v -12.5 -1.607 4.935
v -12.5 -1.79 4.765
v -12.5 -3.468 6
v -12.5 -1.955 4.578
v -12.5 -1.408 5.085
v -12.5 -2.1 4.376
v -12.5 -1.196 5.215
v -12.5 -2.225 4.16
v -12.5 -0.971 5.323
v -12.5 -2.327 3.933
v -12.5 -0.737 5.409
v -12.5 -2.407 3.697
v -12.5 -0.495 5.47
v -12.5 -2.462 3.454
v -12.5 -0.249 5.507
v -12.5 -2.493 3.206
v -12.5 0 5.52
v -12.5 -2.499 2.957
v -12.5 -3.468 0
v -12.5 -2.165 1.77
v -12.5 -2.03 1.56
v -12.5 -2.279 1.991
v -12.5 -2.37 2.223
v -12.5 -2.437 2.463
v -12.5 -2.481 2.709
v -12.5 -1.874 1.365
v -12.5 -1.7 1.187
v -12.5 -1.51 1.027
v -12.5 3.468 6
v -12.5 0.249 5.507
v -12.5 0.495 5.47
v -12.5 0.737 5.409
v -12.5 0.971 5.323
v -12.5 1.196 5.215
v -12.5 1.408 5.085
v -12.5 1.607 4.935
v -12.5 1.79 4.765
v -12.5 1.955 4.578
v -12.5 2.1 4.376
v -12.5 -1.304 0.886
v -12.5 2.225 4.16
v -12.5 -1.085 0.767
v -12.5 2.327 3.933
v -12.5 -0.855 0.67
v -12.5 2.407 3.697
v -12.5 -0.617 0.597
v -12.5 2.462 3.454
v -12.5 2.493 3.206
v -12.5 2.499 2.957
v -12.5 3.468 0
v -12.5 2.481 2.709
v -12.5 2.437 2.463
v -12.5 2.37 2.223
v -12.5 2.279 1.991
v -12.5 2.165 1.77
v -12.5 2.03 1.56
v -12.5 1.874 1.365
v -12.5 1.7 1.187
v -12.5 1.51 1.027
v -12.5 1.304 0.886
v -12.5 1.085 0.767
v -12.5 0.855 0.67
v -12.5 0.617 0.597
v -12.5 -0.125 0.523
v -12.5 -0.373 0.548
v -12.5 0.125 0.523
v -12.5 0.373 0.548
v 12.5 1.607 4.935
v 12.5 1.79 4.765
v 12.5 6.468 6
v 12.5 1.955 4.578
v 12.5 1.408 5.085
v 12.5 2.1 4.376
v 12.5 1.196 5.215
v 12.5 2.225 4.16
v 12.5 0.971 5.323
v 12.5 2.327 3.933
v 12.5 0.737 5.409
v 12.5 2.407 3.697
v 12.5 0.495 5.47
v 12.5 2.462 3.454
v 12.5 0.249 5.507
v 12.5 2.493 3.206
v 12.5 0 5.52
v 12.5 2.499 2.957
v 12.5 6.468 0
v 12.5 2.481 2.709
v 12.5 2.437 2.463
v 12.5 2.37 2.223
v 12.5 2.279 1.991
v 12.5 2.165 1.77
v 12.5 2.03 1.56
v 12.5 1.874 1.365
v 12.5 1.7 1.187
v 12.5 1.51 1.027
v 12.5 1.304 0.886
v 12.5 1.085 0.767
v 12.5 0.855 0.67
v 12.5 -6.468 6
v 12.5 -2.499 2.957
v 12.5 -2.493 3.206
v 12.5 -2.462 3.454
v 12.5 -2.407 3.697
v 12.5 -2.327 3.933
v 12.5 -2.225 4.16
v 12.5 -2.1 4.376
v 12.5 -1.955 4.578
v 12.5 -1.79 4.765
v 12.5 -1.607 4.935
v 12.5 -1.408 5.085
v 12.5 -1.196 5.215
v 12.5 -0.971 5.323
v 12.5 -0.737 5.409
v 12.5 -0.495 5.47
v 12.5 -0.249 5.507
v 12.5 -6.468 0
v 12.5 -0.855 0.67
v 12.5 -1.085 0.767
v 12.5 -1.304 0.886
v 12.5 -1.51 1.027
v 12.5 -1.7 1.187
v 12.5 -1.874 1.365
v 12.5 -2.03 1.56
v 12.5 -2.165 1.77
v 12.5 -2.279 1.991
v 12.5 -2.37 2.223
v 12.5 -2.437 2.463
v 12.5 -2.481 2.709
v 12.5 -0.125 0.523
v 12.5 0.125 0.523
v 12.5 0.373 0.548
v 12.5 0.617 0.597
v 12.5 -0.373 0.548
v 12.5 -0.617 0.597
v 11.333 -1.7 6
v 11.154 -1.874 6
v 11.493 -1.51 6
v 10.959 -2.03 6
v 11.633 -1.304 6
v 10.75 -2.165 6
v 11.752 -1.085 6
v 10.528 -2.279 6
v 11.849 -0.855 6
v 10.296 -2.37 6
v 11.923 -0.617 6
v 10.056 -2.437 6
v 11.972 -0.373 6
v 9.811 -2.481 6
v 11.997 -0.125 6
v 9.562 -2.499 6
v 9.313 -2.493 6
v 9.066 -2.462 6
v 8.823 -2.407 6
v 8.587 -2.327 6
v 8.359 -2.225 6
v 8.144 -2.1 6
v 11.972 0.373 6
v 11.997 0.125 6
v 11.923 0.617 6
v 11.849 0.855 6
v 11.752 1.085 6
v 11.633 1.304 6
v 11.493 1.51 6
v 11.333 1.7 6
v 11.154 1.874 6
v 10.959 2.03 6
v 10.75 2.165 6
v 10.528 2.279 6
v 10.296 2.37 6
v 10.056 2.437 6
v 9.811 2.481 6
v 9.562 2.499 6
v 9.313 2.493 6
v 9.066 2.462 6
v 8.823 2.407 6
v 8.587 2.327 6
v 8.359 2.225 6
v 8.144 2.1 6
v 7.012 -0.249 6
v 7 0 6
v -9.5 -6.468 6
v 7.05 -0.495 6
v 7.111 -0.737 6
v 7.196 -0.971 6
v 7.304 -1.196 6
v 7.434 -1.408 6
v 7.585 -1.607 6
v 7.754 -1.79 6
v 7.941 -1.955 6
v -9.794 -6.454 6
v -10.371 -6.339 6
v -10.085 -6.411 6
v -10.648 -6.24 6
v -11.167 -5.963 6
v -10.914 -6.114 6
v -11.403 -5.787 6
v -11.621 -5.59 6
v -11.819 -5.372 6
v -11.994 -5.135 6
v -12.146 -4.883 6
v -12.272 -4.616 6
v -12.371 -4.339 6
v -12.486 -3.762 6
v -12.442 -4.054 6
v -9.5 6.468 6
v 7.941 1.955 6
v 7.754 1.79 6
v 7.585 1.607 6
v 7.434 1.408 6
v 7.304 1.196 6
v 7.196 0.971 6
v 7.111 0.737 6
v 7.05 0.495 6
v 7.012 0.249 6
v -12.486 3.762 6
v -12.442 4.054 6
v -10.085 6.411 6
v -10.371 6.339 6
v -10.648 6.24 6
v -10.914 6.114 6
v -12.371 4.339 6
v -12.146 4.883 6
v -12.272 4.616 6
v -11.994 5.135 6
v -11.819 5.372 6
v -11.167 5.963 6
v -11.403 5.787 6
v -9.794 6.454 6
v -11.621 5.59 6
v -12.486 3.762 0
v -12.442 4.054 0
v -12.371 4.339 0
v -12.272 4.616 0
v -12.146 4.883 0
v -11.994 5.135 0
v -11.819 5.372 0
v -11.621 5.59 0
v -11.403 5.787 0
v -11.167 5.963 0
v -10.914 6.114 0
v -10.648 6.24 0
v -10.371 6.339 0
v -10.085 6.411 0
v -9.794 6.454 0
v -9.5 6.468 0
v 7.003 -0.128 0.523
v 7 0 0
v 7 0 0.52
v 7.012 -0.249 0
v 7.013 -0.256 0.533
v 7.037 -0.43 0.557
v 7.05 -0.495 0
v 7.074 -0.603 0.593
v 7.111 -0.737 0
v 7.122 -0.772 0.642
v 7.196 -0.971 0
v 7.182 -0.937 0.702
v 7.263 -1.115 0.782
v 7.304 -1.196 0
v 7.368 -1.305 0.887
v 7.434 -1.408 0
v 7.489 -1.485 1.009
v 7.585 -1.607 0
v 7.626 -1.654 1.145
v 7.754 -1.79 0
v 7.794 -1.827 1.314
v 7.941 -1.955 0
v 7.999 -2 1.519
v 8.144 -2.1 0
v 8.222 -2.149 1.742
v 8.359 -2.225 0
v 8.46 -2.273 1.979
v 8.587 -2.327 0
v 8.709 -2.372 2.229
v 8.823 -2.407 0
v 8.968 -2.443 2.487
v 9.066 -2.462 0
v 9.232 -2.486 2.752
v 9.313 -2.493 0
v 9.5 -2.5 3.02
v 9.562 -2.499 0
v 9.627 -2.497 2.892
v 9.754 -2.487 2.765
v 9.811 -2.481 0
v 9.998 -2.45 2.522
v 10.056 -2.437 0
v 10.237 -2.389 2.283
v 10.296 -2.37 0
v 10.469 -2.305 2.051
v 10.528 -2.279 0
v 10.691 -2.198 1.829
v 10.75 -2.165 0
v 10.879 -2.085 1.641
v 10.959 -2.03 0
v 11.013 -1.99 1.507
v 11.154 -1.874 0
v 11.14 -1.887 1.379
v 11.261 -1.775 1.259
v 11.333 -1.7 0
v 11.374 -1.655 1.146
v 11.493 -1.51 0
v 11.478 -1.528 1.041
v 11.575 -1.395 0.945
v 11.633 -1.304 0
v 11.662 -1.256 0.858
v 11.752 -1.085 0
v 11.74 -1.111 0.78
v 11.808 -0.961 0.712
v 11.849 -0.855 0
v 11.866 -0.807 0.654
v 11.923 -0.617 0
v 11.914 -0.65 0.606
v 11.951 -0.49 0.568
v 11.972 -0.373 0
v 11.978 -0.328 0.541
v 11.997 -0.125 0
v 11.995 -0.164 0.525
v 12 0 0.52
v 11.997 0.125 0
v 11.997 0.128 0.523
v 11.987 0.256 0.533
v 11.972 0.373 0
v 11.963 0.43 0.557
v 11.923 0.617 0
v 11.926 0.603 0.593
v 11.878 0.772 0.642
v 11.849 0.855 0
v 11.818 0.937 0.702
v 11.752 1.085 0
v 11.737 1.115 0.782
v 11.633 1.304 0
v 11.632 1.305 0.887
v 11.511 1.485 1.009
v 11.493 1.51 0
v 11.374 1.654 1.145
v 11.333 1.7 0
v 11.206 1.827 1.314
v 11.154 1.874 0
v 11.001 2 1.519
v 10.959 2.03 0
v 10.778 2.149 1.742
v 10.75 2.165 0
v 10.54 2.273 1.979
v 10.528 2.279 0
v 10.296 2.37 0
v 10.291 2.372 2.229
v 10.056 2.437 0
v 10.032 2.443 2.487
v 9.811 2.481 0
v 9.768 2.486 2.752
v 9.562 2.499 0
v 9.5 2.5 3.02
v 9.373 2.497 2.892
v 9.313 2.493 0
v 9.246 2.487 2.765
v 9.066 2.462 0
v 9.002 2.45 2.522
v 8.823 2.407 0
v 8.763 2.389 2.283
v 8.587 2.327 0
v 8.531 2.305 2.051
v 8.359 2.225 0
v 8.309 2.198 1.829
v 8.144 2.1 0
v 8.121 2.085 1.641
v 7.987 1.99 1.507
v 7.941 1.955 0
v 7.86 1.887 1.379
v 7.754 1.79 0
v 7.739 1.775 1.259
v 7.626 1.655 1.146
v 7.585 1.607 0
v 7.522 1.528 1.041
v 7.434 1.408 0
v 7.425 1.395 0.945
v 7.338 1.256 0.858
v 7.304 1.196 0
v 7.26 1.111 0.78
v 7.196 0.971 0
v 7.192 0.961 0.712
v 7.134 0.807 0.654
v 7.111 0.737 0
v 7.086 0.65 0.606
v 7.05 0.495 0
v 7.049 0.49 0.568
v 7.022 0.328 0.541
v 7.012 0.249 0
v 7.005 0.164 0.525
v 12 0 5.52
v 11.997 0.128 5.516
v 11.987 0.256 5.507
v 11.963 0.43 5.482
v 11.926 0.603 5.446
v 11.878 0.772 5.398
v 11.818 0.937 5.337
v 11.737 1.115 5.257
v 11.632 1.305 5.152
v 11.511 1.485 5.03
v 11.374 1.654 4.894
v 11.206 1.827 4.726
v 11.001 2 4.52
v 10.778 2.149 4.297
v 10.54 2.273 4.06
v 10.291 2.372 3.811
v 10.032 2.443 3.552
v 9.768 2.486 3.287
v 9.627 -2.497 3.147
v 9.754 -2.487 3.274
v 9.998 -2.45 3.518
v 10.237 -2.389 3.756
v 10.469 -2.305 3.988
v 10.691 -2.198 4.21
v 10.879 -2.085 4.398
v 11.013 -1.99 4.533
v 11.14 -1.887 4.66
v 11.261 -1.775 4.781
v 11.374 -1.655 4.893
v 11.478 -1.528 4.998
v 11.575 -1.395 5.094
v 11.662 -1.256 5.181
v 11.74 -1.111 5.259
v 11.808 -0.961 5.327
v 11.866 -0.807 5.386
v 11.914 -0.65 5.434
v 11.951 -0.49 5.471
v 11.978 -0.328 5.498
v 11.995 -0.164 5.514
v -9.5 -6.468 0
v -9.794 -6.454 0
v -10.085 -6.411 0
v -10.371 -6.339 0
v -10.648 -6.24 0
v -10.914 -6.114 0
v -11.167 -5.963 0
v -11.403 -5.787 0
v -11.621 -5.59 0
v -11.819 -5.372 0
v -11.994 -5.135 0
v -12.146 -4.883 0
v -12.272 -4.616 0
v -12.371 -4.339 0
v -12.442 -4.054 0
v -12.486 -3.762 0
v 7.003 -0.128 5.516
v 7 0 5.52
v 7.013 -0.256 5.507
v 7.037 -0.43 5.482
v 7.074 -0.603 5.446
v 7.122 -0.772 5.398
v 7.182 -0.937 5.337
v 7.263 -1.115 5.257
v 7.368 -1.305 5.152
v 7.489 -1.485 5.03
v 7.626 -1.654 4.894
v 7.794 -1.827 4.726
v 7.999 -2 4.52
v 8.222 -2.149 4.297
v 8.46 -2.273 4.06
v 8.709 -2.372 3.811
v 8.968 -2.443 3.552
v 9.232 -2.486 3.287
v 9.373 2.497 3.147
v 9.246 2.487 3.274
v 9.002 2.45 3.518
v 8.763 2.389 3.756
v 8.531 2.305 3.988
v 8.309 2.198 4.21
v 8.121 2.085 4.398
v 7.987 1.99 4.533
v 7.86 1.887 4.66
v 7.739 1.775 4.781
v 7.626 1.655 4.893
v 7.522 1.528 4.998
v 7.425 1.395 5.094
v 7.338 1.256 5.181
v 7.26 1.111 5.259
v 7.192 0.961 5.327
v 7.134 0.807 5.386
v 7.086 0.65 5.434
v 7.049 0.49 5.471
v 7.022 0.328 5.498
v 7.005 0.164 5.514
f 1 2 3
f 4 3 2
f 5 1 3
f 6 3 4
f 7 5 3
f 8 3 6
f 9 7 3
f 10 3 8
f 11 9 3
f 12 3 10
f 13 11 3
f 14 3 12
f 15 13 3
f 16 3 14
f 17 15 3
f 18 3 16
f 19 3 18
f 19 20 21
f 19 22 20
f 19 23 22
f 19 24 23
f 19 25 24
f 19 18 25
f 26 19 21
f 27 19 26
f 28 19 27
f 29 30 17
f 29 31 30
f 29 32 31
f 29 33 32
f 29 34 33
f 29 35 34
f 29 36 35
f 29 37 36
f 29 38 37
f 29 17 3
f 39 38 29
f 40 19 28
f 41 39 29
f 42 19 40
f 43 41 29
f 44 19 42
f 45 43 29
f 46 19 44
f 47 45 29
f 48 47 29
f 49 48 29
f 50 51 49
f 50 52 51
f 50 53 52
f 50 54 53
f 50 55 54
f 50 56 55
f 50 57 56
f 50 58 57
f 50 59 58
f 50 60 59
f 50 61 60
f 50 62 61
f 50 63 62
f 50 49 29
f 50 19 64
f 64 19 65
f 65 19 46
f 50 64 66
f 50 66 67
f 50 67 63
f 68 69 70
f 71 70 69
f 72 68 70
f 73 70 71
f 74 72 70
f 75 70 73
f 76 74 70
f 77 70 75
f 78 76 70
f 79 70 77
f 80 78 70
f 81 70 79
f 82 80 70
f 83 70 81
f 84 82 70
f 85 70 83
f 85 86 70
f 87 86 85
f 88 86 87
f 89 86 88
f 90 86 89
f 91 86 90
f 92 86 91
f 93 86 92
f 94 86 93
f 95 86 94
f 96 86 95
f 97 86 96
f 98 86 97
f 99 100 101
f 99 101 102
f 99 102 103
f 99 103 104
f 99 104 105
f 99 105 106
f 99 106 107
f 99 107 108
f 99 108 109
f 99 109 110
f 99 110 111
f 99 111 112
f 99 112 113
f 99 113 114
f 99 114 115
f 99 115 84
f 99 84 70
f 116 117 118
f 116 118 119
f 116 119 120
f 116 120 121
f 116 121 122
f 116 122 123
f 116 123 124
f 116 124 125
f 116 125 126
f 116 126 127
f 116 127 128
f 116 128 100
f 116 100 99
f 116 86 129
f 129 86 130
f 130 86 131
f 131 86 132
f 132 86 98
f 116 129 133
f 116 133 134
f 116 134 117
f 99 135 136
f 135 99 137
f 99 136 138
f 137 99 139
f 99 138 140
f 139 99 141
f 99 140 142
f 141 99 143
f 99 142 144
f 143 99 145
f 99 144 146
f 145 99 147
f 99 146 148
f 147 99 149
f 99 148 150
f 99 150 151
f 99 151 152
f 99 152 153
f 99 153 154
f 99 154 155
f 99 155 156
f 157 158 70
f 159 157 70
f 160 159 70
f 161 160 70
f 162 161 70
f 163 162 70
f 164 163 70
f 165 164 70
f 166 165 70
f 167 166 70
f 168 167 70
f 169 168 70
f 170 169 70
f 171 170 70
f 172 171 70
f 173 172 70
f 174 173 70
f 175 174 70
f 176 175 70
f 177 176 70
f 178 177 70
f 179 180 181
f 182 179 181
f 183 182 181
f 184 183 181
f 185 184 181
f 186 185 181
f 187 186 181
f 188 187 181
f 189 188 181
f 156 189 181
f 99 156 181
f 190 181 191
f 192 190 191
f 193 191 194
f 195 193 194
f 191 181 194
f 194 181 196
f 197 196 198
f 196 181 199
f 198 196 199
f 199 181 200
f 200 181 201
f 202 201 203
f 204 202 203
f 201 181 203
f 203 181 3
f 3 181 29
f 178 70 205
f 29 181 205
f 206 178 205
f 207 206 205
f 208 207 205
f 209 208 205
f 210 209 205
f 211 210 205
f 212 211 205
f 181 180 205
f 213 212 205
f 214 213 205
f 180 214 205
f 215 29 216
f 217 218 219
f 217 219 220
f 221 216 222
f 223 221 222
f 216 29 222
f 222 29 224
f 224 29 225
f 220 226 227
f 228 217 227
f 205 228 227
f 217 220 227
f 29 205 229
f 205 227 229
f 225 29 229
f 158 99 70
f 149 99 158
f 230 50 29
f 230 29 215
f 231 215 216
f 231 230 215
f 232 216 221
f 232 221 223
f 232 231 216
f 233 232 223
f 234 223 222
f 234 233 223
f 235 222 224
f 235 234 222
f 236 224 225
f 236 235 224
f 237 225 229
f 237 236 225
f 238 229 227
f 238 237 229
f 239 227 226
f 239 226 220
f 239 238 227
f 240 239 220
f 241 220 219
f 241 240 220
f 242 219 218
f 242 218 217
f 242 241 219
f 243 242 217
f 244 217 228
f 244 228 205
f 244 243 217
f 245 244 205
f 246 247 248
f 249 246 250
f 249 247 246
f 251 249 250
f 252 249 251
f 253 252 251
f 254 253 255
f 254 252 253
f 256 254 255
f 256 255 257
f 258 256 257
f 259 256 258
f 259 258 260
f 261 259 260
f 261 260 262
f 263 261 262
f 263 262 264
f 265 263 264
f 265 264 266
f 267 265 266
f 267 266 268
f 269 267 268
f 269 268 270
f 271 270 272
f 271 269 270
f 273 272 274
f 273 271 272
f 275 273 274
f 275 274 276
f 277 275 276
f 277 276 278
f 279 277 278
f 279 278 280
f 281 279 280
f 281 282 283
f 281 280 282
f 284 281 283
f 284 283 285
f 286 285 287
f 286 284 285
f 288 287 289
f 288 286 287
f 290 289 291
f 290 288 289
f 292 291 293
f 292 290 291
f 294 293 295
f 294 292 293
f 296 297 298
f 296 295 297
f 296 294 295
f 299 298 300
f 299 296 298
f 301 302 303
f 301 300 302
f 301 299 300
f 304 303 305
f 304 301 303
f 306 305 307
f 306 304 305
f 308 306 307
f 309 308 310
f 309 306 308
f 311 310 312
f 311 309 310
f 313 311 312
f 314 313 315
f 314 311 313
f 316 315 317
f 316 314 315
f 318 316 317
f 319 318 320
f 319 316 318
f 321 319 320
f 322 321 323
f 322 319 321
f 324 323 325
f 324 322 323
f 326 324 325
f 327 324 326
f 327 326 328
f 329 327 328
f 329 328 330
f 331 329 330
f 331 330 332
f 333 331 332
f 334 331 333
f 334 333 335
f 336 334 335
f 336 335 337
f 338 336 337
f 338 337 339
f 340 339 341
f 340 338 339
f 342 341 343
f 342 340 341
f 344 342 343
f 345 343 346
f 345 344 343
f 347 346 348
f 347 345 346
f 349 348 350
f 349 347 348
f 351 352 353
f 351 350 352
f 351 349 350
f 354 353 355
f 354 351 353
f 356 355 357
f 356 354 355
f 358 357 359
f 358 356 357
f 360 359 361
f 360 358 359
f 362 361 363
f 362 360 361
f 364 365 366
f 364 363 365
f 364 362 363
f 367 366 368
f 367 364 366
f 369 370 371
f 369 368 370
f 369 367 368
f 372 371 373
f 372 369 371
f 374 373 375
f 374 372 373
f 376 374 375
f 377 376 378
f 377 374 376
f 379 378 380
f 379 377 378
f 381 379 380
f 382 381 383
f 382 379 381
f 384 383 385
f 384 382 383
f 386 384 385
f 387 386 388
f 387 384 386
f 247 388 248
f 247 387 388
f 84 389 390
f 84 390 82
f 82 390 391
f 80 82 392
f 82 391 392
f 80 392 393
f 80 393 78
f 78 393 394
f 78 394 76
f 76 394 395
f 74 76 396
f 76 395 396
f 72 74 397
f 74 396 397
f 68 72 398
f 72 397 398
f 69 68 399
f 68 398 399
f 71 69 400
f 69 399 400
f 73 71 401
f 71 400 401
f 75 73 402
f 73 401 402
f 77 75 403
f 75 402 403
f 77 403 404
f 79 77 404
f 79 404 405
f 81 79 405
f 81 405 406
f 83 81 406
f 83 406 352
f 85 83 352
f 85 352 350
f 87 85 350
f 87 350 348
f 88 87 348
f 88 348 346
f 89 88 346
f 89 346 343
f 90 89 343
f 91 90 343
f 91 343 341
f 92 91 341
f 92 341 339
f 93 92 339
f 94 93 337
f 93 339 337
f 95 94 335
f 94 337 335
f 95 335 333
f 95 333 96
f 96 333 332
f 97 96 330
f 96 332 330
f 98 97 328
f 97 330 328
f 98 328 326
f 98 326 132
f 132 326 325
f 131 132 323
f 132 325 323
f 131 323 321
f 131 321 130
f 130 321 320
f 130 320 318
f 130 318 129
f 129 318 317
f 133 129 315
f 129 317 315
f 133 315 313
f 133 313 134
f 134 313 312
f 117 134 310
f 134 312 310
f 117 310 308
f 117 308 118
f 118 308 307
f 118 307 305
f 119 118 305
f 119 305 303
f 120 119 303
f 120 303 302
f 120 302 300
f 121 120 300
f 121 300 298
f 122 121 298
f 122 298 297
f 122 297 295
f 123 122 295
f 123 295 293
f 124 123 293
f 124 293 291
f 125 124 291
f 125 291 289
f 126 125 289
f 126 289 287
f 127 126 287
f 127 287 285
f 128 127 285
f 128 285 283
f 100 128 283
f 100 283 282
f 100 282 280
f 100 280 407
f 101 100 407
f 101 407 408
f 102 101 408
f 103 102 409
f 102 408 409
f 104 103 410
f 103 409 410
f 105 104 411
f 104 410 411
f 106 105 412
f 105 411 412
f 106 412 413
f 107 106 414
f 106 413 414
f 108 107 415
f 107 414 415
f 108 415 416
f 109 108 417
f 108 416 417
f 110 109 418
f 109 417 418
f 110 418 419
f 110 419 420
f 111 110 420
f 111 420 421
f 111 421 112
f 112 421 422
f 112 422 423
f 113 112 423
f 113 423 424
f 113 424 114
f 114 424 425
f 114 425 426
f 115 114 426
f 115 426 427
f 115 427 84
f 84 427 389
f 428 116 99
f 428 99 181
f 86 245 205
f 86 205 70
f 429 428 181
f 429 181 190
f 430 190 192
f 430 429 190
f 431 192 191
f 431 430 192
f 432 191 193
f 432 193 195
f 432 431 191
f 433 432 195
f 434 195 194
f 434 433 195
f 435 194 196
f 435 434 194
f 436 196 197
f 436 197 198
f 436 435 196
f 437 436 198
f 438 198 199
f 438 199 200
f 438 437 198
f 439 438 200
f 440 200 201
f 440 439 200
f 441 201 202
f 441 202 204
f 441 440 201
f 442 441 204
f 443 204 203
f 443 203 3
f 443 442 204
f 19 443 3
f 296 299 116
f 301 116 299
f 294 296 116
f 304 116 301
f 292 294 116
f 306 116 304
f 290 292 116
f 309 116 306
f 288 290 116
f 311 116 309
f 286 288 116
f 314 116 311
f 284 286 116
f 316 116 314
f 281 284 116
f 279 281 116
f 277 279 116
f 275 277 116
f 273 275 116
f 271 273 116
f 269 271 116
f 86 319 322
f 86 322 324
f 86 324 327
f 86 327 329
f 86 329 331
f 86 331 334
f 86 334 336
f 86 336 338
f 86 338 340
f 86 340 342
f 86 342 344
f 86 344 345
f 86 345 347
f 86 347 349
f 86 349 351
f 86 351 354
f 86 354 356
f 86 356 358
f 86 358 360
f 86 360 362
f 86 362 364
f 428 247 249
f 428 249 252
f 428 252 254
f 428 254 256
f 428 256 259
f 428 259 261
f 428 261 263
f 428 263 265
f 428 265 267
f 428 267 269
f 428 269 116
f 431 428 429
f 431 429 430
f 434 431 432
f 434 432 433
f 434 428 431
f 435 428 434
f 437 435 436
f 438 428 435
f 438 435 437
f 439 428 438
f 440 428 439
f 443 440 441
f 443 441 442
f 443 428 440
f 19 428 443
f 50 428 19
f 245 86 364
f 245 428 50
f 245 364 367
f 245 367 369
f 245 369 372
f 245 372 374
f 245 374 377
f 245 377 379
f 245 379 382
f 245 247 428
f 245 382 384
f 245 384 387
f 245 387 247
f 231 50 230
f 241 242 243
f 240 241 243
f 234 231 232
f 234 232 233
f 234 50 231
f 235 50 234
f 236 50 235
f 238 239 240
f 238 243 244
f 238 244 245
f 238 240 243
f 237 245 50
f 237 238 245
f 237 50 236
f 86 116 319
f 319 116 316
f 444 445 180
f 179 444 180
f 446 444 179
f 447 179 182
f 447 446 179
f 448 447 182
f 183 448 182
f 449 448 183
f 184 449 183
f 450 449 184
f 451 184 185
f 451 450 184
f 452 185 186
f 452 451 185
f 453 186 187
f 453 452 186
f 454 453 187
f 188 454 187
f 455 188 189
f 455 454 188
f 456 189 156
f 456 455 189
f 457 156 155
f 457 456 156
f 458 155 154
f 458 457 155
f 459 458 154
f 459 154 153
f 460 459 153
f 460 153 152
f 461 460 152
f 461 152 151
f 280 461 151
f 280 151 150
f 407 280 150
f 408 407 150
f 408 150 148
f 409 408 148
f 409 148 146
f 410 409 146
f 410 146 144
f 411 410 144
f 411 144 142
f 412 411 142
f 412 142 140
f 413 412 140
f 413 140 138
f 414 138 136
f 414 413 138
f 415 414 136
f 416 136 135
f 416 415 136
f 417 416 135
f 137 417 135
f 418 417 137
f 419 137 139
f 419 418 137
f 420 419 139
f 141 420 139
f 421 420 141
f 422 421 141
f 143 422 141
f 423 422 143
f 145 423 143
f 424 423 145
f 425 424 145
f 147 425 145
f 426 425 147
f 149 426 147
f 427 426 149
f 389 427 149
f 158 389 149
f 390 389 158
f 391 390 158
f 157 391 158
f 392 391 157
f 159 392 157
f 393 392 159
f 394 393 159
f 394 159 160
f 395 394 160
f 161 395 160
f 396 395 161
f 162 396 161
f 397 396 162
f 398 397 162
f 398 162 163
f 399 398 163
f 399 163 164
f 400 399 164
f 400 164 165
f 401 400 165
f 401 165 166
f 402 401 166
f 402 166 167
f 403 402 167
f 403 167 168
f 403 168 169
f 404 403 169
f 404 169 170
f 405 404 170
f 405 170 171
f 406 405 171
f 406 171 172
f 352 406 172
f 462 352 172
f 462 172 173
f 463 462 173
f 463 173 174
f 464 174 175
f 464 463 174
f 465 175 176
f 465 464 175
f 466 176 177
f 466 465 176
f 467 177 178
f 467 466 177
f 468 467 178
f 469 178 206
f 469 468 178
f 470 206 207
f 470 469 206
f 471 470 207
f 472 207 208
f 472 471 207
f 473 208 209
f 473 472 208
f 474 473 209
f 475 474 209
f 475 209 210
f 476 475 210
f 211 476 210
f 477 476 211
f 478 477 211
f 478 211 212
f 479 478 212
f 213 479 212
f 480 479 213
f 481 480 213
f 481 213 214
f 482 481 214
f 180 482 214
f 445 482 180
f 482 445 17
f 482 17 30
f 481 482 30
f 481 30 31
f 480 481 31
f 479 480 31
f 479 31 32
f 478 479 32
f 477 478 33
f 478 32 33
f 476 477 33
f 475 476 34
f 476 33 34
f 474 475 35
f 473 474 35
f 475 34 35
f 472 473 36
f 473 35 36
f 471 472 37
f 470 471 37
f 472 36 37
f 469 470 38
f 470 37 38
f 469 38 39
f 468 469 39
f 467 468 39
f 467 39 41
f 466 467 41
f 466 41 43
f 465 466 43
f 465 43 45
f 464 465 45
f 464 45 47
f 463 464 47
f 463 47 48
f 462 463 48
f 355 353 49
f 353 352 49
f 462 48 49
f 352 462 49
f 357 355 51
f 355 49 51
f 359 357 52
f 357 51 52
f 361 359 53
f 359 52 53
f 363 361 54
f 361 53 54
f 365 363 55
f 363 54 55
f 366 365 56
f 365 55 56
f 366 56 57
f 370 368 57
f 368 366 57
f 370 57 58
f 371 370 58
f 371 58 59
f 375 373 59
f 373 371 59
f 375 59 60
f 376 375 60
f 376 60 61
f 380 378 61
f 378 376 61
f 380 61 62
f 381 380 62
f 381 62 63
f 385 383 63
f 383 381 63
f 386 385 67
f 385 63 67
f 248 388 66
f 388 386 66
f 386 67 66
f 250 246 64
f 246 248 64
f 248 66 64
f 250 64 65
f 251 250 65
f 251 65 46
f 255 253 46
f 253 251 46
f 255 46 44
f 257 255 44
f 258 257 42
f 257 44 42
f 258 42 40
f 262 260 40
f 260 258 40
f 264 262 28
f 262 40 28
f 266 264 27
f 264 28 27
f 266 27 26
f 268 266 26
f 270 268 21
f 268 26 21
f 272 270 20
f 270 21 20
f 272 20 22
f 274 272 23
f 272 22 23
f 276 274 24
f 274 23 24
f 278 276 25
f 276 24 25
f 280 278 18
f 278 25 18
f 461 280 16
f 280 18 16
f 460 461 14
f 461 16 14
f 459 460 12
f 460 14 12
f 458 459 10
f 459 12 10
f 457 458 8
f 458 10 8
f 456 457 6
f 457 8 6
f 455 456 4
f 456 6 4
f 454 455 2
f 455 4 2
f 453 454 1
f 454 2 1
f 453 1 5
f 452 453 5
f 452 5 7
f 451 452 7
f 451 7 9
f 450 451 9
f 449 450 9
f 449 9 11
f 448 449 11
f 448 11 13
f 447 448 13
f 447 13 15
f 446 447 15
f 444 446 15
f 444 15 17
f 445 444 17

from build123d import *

# Parameters (mm, degrees)
SKETCH4_R           = 2.5
BOSS_EXTRUDE2_DEPTH = 6
SKETCH5_R           = 2.5
CUT_EXTRUDE1_DEPTH  = 27.511142593


with BuildPart() as part:
    # Sketch4 → Boss-Extrude2 (new body)
    with BuildSketch(Plane.XY):
        with BuildLine():
            Line((-9.5, 6.468437336), (12.5, 6.468437336))
            Line((12.5, 6.468437336), (12.5, -6.468437336))
            Line((12.5, -6.468437336), (-9.5, -6.468437336))
            ThreePointArc((-9.5, -6.468437336), (-11.621320344, -5.58975768), (-12.5, -3.468437336))
            Line((-12.5, -3.468437336), (-12.5, 3.468437336))
            ThreePointArc((-12.5, 3.468437336), (-11.621320344, 5.58975768), (-9.5, 6.468437336))
        make_face()
        with Locations(Location((9.5, 0, 0), (0, 0, 180))):
            Circle(SKETCH4_R, mode=Mode.SUBTRACT)
    extrude(amount=BOSS_EXTRUDE2_DEPTH)

    # Sketch5 → Cut-Extrude1 (cut, through all)
    with BuildSketch(Plane.ZY.offset(12.5)):
        with Locations((3.019651732, 0)):
            Circle(SKETCH5_R)
    extrude(amount=-CUT_EXTRUDE1_DEPTH, mode=Mode.SUBTRACT)


solid = part.part
